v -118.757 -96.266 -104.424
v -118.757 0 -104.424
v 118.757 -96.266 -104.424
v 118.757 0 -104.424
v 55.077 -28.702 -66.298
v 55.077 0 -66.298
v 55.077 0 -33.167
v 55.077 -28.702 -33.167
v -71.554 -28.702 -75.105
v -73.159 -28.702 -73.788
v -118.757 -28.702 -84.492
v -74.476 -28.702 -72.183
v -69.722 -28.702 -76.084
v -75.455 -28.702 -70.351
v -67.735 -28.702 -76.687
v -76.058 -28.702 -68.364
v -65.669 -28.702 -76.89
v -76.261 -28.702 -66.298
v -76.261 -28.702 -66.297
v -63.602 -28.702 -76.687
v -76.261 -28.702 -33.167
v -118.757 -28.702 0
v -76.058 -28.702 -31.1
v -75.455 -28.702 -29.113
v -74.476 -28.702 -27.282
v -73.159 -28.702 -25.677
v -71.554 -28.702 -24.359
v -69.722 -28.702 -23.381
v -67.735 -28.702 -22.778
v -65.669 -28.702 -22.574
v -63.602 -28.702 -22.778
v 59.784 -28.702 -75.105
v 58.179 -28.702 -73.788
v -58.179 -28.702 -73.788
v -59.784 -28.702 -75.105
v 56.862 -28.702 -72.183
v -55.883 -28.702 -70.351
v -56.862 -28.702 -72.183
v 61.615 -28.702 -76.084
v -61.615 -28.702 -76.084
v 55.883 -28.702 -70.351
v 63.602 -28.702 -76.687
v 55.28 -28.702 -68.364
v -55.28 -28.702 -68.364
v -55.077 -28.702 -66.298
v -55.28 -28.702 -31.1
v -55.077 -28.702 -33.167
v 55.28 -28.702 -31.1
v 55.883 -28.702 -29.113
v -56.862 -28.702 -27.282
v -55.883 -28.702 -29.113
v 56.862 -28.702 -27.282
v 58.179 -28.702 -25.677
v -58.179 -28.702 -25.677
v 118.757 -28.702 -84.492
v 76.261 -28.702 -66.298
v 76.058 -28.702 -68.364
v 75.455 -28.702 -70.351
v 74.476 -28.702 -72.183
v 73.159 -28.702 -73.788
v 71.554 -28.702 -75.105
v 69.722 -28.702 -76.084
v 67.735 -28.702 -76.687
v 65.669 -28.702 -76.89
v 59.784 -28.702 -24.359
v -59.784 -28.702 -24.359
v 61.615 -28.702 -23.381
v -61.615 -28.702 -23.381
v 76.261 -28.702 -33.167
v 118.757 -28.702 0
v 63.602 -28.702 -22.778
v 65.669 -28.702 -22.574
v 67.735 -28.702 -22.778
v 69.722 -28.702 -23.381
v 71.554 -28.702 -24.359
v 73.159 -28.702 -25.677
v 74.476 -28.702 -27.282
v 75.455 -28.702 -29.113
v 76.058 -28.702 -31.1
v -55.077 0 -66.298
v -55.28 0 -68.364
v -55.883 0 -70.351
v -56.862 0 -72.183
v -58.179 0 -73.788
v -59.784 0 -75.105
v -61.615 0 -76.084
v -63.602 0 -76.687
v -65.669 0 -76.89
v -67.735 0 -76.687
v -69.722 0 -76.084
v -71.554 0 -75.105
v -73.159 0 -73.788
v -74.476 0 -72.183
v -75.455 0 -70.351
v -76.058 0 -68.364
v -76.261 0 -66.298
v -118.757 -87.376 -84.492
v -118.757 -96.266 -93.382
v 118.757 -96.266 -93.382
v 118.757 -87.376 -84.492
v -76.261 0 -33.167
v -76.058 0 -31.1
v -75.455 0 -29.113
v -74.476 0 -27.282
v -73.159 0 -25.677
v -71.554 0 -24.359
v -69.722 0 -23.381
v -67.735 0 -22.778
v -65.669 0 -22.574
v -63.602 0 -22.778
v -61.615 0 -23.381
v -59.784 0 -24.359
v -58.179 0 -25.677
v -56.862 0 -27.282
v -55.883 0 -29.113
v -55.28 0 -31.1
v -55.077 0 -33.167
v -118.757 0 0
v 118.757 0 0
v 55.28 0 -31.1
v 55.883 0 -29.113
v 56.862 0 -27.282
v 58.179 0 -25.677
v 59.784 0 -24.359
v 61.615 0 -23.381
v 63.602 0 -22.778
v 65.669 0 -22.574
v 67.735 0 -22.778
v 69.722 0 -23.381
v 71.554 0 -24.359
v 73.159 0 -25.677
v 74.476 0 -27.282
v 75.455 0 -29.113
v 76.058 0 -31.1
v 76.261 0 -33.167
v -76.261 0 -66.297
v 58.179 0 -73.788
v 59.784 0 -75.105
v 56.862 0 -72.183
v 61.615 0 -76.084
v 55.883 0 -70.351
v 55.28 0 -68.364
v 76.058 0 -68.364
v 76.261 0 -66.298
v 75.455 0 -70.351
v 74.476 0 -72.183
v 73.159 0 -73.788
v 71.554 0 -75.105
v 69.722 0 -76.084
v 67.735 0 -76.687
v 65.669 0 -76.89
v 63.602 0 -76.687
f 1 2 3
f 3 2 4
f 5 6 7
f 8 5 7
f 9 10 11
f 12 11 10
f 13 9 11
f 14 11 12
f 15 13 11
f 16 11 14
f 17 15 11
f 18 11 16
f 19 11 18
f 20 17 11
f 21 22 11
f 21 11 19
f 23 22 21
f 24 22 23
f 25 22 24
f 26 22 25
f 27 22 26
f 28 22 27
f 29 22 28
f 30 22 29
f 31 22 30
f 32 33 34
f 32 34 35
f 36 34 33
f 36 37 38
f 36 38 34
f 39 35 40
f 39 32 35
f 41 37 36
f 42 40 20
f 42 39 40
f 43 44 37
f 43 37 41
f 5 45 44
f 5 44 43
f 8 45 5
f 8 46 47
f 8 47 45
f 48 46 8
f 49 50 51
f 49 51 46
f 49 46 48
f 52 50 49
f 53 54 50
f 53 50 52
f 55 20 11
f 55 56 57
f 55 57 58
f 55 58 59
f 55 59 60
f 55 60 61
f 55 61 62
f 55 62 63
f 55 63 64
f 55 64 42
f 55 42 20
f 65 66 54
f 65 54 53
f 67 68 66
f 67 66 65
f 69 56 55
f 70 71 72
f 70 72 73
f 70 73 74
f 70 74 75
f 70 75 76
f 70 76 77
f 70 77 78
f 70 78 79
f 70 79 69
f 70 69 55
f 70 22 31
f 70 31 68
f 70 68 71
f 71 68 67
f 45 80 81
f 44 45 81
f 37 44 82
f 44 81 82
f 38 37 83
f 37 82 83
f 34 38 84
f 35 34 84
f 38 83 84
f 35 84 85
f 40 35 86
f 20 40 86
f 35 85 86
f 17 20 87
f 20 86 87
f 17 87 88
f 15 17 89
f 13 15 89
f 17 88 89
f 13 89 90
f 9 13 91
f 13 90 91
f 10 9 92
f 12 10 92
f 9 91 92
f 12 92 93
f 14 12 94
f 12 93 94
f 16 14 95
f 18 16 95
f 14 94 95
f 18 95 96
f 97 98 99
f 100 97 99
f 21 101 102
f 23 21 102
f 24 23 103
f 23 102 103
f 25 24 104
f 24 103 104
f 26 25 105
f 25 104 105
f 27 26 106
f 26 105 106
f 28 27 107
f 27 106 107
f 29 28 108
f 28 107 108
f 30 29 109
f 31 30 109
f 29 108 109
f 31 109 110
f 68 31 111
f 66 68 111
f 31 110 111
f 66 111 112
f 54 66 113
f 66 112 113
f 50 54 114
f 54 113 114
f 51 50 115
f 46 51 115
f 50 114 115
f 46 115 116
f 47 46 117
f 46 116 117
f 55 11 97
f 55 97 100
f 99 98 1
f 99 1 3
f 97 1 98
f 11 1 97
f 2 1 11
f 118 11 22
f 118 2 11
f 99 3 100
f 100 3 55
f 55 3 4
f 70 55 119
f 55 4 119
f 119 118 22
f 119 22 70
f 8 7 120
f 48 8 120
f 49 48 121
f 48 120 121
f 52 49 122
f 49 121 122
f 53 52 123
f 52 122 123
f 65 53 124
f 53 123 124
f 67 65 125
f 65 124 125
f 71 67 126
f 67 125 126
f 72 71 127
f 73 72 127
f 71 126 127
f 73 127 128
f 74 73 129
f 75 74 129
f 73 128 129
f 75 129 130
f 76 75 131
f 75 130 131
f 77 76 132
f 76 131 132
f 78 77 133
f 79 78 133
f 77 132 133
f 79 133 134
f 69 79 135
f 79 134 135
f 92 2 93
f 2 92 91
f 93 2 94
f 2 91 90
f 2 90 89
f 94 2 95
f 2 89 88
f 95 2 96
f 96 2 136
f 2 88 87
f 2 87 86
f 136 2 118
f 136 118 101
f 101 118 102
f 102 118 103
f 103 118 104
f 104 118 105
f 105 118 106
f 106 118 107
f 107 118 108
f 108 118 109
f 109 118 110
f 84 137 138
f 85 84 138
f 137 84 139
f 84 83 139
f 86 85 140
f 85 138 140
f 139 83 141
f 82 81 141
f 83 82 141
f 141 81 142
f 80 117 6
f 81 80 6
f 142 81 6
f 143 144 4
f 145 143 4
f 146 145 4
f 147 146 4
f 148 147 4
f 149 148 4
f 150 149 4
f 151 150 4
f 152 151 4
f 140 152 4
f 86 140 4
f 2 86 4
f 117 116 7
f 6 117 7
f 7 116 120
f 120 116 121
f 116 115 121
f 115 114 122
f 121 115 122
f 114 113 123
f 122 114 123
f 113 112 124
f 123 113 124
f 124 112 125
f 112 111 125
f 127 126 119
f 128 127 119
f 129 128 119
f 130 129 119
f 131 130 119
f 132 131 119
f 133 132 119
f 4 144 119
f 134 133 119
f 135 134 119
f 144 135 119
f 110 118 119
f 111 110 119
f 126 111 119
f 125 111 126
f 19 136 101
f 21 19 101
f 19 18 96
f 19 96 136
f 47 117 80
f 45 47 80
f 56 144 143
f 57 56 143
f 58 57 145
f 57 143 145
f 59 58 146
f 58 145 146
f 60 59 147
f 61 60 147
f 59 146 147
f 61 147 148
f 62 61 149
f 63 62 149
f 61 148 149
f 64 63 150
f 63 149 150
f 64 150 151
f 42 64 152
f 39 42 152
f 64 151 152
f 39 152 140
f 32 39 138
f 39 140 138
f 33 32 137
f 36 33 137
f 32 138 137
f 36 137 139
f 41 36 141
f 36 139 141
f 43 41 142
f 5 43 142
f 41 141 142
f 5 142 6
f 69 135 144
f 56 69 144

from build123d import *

# Parameters (mm, degrees)
F0_W     = 237.5140190125
F0_H     = 104.4240146875
F1_DEPTH = 28.702
F2_W     = 237.5140190125
F2_H     = 19.9324190617
F3_DEPTH = 67.564
F4_SIZE2 = 8.89
F4_SIZE  = 8.89


with BuildPart() as f1:
    # F0 (on Front) → F1 (new body)
    with BuildSketch(Plane.XZ):
        with Locations((0, -52.2120073438)):
            Rectangle(F0_W, F0_H)
        with BuildLine():
            ThreePointArc((-76.26119588, -33.1665679002), (-65.6689032912, -22.5742753114), (-55.0766107024, -33.1665679002))
            Line((-55.0766107024, -33.1665679002), (-55.0766107024, -66.2979632616))
            ThreePointArc((-55.0766107024, -66.2979632616), (-65.6689032912, -76.8902558504), (-76.26119588, -66.2979632616))
            ThreePointArc((-76.26119588, -66.2979632616), (-76.26119587, -66.2975014647), (-76.2611958398, -66.2970396679))
            Line((-76.26119588, -66.2970396679), (-76.26119588, -33.1665679002))
        make_face(mode=Mode.SUBTRACT)
        with BuildLine():
            Line((55.0766107024, -66.2979632616), (55.0766107024, -33.1665679002))
            ThreePointArc((55.0766107024, -33.1665679002), (65.6689032912, -22.5742753114), (76.26119588, -33.1665679002))
            Line((76.26119588, -33.1665679002), (76.26119588, -66.2970396679))
            Line((76.26119588, -66.2970396679), (76.26119588, -66.2979632616))
            ThreePointArc((76.26119588, -66.2979632616), (65.6689032912, -76.8902558504), (55.0766107024, -66.2979632616))
        make_face(mode=Mode.SUBTRACT)
    extrude(amount=F1_DEPTH)

    # F2 (on face) → F3 (join)
    with BuildSketch(Plane.XZ.offset(28.702)):
        with Locations((0, -94.4578051567)):
            Rectangle(F2_W, F2_H)
    extrude(amount=F3_DEPTH)

    # F4
    f4_edges = [f1.edges().sort_by_distance(p)[0] for p in [
        (0, -96.266, -84.491596),
    ]]
    chamfer(f4_edges, length=F4_SIZE, length2=F4_SIZE2)


solid = f1.part
